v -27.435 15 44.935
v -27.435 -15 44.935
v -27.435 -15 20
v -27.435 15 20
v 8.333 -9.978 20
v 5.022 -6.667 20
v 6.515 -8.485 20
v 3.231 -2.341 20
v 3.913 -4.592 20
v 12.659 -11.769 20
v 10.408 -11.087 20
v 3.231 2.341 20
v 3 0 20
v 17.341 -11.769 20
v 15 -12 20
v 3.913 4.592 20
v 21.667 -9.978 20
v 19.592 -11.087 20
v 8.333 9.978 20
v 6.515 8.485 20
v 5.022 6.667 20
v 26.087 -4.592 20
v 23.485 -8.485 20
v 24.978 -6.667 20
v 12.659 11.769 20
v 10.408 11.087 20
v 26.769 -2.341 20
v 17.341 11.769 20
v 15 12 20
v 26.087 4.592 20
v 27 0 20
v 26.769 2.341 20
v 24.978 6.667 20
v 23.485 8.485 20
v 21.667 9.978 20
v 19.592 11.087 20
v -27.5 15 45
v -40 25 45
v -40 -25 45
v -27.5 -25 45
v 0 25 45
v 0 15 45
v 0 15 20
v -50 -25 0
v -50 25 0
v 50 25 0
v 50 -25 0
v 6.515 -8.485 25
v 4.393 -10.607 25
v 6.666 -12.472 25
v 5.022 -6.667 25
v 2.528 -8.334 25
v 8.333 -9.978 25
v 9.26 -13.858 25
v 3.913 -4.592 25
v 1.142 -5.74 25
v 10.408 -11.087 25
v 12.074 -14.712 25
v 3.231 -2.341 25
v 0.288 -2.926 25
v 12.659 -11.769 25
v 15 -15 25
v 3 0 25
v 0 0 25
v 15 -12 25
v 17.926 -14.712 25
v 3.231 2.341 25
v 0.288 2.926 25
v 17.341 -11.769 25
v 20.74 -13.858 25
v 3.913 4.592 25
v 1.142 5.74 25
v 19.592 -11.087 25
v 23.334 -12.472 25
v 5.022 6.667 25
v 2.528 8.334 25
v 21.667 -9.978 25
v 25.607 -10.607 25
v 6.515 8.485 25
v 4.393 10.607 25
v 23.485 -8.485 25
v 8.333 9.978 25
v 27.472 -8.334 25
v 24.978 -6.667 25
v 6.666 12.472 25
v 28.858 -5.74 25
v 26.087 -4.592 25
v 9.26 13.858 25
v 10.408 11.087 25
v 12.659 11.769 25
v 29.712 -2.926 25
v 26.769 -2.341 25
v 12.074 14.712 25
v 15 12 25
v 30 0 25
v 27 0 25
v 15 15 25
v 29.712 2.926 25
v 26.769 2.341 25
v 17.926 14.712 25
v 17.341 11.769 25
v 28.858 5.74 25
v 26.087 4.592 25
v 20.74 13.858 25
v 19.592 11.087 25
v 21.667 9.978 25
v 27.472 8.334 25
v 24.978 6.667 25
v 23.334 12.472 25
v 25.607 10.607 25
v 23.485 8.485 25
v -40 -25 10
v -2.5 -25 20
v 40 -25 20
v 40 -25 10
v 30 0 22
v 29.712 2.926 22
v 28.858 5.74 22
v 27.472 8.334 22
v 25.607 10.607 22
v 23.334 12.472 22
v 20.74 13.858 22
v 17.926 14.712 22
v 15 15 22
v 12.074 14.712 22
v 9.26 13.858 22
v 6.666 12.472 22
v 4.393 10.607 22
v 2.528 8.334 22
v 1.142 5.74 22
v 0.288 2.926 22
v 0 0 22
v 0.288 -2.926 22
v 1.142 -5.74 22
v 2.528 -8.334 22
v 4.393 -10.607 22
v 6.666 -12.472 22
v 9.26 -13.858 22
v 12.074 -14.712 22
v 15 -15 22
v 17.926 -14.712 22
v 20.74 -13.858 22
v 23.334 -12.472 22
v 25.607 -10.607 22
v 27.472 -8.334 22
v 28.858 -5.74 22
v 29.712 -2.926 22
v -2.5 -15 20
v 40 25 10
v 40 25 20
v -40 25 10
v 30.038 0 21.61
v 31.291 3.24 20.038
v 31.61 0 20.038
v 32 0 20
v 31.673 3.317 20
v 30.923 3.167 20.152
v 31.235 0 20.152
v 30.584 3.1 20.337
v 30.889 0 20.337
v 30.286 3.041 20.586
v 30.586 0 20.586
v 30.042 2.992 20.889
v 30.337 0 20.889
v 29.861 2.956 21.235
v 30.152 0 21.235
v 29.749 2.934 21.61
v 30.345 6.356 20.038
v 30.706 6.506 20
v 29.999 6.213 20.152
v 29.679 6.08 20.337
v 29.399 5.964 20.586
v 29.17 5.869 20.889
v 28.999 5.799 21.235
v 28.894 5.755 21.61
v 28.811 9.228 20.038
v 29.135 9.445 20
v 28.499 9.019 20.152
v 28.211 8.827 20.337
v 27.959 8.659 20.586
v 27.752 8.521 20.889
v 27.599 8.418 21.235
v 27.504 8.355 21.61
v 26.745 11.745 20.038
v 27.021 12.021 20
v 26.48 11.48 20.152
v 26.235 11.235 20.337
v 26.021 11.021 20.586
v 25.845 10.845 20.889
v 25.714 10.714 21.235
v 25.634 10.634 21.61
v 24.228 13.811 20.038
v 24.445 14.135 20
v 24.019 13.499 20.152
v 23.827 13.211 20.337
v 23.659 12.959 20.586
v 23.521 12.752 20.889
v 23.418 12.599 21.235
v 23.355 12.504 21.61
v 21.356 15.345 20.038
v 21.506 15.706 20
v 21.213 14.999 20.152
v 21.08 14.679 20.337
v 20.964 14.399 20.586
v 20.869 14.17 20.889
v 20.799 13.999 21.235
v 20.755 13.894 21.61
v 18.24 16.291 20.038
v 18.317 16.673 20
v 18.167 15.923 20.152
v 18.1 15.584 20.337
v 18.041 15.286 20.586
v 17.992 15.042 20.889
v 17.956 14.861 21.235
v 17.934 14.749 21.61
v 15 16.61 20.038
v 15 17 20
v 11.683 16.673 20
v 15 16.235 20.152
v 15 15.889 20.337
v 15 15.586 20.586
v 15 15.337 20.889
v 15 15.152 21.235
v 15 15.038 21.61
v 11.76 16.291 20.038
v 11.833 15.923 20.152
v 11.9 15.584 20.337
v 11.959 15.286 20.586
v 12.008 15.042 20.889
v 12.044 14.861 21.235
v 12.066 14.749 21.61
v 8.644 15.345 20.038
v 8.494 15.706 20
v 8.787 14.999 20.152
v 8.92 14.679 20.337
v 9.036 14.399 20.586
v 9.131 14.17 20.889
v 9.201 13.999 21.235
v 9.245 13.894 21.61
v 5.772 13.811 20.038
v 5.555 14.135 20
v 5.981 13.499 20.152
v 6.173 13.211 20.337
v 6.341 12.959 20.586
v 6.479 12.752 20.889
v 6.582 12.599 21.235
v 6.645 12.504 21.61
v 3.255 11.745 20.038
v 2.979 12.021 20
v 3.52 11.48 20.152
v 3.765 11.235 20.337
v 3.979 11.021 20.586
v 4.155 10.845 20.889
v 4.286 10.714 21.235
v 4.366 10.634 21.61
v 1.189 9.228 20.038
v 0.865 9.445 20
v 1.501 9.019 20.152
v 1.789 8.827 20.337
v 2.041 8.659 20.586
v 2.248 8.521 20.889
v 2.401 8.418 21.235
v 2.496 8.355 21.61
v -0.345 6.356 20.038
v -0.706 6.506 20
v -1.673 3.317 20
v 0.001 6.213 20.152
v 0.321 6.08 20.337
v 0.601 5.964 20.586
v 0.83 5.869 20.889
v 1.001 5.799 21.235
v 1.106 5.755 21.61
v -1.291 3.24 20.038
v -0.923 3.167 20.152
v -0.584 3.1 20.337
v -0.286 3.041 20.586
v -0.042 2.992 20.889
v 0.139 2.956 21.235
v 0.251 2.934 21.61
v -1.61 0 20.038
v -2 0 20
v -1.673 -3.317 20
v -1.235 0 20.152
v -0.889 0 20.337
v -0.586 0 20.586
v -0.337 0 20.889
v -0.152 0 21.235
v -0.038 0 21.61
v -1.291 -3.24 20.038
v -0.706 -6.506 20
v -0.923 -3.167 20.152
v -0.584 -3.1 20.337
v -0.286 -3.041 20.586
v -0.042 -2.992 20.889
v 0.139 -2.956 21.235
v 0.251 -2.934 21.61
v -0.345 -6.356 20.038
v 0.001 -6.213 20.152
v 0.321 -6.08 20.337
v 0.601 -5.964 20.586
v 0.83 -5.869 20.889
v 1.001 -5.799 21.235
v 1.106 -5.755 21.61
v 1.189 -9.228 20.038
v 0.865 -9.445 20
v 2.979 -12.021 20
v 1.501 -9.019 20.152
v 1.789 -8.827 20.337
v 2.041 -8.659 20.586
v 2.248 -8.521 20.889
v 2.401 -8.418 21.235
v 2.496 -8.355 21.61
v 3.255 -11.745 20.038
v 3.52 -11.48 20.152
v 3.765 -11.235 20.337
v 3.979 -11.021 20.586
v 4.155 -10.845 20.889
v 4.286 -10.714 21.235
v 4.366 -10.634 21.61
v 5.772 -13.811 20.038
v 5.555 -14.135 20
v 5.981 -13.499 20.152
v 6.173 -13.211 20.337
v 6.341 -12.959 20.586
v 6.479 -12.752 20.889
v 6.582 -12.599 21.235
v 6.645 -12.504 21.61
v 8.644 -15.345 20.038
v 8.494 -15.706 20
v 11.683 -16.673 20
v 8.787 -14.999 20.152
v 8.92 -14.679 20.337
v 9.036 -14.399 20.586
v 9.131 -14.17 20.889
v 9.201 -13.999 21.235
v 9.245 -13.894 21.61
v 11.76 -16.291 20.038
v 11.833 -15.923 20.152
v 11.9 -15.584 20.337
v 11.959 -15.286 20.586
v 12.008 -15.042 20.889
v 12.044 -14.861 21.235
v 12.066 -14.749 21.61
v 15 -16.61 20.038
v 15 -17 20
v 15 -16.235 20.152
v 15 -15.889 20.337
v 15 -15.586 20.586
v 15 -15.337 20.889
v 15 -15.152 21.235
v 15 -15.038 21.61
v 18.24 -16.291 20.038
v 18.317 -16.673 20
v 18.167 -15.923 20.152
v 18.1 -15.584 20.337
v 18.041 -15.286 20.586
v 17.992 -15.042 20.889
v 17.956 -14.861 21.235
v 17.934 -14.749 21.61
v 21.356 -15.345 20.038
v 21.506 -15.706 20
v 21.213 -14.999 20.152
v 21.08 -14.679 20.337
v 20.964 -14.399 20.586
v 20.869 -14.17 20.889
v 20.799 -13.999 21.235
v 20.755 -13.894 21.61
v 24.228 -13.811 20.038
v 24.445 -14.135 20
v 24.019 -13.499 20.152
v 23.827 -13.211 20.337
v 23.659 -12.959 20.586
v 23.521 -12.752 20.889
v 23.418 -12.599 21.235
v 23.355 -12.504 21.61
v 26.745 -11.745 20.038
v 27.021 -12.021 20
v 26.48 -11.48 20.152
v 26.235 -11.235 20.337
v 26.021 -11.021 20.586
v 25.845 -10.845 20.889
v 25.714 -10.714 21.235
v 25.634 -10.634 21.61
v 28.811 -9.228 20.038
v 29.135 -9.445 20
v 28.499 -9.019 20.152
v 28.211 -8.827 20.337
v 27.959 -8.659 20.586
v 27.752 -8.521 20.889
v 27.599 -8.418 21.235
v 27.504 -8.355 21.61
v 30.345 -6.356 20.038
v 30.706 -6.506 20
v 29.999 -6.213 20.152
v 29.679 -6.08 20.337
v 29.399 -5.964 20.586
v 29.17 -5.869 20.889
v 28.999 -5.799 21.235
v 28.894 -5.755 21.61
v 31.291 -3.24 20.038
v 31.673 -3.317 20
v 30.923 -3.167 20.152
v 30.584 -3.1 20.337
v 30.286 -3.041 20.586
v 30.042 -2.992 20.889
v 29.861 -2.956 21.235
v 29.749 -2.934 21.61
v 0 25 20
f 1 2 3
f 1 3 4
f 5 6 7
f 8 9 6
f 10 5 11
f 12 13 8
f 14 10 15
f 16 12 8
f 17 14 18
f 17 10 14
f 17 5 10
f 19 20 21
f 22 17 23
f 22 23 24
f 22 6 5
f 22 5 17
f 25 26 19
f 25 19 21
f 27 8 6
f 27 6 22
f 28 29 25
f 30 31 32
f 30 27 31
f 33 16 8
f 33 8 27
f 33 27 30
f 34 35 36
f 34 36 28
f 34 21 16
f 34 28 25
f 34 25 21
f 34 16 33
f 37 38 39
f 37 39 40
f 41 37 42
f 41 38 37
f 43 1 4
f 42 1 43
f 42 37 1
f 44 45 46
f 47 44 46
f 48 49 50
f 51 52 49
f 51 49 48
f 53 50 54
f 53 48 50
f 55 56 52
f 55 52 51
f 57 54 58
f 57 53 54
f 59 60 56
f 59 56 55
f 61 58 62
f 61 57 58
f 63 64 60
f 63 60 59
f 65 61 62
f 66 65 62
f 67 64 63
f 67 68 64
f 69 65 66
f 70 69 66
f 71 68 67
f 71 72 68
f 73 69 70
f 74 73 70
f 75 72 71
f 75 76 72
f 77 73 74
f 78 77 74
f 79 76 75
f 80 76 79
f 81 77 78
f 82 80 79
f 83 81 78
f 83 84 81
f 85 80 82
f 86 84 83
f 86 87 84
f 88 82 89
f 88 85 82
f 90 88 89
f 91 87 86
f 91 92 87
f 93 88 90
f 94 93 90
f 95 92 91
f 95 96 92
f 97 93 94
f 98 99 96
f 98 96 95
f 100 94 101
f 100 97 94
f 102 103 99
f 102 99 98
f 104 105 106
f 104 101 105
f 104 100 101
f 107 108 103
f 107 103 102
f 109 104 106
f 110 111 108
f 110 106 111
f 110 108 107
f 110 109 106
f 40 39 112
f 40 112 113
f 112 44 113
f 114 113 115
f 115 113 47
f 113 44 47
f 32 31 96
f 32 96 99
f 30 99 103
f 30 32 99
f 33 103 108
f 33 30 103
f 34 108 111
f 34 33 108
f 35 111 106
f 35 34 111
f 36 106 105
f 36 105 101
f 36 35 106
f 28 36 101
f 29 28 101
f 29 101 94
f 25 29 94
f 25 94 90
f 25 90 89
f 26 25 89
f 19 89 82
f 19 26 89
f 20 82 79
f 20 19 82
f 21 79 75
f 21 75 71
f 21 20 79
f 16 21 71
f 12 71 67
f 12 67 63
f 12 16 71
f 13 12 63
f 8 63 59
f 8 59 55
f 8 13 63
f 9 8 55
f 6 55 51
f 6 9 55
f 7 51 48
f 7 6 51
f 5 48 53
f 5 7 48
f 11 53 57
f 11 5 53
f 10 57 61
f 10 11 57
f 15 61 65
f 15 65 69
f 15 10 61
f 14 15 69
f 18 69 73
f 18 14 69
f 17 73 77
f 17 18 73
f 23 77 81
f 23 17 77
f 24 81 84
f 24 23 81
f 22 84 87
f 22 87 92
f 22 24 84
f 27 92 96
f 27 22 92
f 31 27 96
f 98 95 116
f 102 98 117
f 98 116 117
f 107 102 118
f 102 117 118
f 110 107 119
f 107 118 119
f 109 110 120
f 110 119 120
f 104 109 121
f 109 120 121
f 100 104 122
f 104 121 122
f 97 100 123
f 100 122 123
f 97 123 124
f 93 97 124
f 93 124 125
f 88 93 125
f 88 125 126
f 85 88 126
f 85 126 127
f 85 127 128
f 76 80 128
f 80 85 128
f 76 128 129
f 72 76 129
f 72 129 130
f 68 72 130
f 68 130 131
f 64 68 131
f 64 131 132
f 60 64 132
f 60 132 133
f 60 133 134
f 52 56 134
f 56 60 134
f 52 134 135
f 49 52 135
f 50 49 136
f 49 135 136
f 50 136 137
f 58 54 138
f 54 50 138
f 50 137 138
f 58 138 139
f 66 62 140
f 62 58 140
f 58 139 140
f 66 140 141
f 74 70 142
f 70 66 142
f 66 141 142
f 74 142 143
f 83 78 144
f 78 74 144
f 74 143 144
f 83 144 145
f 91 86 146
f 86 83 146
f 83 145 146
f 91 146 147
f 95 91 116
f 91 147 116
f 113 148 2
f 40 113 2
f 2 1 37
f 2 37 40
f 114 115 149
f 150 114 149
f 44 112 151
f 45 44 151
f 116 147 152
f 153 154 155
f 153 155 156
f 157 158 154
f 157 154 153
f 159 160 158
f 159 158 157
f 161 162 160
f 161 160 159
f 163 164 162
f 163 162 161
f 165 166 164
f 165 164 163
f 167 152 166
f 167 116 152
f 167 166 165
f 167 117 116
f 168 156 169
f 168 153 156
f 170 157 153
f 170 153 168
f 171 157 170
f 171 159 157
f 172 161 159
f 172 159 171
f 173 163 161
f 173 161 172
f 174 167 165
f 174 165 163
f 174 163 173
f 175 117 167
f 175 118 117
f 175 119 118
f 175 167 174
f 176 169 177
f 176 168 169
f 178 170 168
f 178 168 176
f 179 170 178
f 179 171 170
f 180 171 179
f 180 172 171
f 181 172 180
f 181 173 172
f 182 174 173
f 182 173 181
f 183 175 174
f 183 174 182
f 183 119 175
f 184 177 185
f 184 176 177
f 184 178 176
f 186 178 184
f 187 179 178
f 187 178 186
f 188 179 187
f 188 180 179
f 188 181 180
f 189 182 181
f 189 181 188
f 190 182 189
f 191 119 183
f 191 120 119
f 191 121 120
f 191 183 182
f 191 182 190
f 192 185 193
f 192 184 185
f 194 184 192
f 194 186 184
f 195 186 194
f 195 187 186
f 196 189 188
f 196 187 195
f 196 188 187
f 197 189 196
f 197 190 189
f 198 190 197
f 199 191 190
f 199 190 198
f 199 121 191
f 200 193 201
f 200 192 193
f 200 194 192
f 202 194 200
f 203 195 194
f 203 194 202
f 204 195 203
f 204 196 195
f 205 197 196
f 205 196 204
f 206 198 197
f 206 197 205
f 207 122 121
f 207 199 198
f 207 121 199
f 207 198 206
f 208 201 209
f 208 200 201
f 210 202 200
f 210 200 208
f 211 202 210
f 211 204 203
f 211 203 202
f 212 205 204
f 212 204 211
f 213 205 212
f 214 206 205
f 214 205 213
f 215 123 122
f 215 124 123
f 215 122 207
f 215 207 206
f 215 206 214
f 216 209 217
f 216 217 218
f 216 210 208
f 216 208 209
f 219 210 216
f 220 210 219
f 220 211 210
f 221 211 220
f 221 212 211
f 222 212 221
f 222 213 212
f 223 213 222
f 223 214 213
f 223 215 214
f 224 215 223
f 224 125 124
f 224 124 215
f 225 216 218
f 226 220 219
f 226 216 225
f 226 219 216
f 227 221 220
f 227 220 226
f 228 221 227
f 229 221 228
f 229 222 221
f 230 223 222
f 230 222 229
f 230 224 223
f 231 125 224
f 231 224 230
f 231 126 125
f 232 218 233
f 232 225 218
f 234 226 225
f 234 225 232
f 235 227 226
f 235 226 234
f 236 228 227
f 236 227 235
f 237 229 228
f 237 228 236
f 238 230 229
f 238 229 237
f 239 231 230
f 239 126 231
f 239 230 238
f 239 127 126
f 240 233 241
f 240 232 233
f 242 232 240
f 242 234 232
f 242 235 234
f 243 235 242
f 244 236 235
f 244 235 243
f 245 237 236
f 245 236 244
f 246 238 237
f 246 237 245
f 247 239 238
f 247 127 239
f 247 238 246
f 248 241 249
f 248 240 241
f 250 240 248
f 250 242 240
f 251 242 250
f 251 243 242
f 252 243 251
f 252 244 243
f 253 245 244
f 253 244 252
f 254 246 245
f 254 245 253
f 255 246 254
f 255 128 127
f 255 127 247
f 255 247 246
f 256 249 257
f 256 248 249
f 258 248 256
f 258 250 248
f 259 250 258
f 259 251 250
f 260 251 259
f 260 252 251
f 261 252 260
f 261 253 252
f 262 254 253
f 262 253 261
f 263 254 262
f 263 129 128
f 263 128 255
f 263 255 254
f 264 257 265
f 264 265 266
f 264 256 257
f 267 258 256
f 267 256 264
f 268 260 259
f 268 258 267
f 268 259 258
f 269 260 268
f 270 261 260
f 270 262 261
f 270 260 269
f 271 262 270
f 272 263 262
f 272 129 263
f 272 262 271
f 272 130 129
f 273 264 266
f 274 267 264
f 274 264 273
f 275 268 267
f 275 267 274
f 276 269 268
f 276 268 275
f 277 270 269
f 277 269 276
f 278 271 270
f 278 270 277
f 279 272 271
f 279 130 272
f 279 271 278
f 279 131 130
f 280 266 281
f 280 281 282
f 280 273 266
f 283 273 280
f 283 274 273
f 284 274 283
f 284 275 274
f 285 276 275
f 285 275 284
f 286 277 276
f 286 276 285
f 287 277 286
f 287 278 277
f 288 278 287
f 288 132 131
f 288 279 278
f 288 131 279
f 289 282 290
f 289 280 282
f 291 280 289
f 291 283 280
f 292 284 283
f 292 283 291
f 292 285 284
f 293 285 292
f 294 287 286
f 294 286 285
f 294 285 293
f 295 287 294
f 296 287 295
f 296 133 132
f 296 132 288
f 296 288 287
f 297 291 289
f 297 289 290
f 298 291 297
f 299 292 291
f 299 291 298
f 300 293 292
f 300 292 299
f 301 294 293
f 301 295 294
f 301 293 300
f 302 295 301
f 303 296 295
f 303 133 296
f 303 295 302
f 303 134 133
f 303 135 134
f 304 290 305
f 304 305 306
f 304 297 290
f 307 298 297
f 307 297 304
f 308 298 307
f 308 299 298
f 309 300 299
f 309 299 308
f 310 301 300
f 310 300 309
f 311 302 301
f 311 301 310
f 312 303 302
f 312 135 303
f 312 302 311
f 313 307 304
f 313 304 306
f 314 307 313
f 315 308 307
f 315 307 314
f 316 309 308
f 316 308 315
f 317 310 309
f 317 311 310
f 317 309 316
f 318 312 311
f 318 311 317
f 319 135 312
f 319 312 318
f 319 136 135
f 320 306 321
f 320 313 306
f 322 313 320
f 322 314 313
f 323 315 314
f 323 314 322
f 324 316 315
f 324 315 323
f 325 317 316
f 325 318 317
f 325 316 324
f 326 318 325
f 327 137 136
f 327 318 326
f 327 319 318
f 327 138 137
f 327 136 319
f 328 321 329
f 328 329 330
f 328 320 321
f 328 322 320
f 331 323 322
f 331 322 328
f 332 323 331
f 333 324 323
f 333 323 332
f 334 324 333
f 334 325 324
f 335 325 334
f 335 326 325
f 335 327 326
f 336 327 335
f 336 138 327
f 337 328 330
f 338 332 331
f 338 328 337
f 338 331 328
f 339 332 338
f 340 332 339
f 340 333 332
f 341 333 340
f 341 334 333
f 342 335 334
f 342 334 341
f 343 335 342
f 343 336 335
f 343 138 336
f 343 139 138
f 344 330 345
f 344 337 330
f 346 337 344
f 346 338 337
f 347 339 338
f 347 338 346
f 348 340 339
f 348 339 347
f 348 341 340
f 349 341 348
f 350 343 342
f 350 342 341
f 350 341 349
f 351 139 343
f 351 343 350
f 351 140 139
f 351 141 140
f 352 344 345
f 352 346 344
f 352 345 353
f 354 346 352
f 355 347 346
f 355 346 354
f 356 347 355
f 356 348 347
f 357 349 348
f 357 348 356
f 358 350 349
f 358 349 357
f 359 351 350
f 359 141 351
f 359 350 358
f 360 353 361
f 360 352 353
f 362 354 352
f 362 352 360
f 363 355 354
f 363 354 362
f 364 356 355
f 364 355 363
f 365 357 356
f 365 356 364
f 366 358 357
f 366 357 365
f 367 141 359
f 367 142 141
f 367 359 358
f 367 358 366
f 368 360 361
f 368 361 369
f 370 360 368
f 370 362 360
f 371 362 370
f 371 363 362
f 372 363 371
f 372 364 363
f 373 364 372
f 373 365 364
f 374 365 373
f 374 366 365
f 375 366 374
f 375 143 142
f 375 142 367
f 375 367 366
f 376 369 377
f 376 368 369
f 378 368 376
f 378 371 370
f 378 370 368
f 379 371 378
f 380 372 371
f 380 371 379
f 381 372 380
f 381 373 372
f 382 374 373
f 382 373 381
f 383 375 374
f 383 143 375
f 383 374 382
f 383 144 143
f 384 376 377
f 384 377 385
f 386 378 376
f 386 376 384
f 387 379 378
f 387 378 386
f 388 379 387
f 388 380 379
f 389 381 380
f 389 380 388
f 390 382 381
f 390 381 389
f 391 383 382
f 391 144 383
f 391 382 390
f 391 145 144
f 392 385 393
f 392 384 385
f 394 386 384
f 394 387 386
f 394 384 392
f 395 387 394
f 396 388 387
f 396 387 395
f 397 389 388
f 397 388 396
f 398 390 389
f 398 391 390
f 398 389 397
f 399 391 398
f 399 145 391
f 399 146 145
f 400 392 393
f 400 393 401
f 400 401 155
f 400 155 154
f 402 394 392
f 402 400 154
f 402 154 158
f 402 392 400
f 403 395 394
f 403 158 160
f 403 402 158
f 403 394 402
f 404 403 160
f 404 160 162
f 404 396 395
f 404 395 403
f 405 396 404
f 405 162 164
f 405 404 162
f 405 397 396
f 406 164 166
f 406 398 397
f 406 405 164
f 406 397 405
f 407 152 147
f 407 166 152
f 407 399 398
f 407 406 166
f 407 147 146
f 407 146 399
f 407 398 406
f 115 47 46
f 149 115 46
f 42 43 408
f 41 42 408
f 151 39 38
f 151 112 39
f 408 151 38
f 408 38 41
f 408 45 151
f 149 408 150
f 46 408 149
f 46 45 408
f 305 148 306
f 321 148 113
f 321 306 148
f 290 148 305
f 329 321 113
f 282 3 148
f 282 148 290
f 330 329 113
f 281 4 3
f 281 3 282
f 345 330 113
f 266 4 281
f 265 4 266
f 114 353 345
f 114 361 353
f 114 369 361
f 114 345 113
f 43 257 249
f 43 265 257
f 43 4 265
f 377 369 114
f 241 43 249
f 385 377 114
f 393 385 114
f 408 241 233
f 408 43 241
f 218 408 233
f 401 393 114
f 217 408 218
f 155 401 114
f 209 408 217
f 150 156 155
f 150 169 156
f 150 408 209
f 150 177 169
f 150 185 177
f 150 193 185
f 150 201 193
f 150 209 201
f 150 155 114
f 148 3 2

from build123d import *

# Parameters (mm, degrees)
SKETCH1_W           = 100
SKETCH1_H           = 50
BOSS_EXTRUDE2_DEPTH = 10
SKETCH3_W           = 80
SKETCH3_H           = 50
BOSS_EXTRUDE3_DEPTH = 10
SKETCH4_W           = 40
SKETCH4_H           = 50
BOSS_EXTRUDE4_DEPTH = 25
SKETCH5_W           = 60
SKETCH5_H           = 30
CUT_EXTRUDE1_DEPTH  = 25
SKETCH6_R           = 15
SKETCH6_R_2         = 12
BOSS_EXTRUDE5_DEPTH = 5
CHAMFER2_SIZE       = 10
CHAMFER3_SIZE       = 10
FILLET3_R           = 2
CHAMFER6_SIZE       = 27.5


# Some blends are built 0.0001 mm under size
with BuildPart() as part:
    # Sketch1 → Boss-Extrude2 (new body)
    with BuildSketch(Plane.XY):
        Rectangle(SKETCH1_W, SKETCH1_H)
    extrude(amount=BOSS_EXTRUDE2_DEPTH)

    # Sketch3 → Boss-Extrude3 (add)
    with BuildSketch(Plane.XY.offset(10)):
        Rectangle(SKETCH3_W, SKETCH3_H)
    extrude(amount=BOSS_EXTRUDE3_DEPTH)

    # Sketch4 → Boss-Extrude4 (add)
    with BuildSketch(Plane.XY.offset(20)):
        with Locations((-20, 0)):
            Rectangle(SKETCH4_W, SKETCH4_H)
    extrude(amount=BOSS_EXTRUDE4_DEPTH)

    # Sketch5 → Cut-Extrude1 (cut)
    with BuildSketch(Plane.XY.offset(45)):
        with Locations((2.565042783, 0)):
            Rectangle(SKETCH5_W, SKETCH5_H)
    extrude(amount=-CUT_EXTRUDE1_DEPTH, mode=Mode.SUBTRACT)

    # Sketch6 → Boss-Extrude5 (add)
    with BuildSketch(Plane.XY.offset(20)):
        with Locations((15, 0)):
            Circle(SKETCH6_R)
        with Locations((15, 0)):
            Circle(SKETCH6_R_2, mode=Mode.SUBTRACT)
    extrude(amount=BOSS_EXTRUDE5_DEPTH)

    # Chamfer2
    chamfer2_edges = [part.edges().sort_by_distance(p)[0] for p in [
        (50, 0, 10),
    ]]
    chamfer(chamfer2_edges, length=CHAMFER2_SIZE - 0.0001)  # a hair under: the kernel refuses the full size

    # Chamfer3
    chamfer3_edges = [part.edges().sort_by_distance(p)[0] for p in [
        (-50, 0, 10),
    ]]
    chamfer(chamfer3_edges, length=CHAMFER3_SIZE - 0.0001)  # a hair under: the kernel refuses the full size

    # Fillet3
    fillet3_edges = [part.edges().sort_by_distance(p)[0] for p in [
        (0, 0, 20),
    ]]
    fillet(fillet3_edges, radius=FILLET3_R)

    # Chamfer6
    # the kernel refuses this chamfer: 27.5 mm, written as the material it takes off along each edge
    with BuildSketch(Plane(origin=(0, -15, 45), x_dir=(0.027495876610586376, 0, -0.9996219169112968), z_dir=(0, -1, 0))) as chamfer6_piece_1_section:
        Polygon((CHAMFER6_SIZE * 0.999621916911, -CHAMFER6_SIZE * 0.0274958766106), (-CHAMFER6_SIZE * 0.0274958766106, -CHAMFER6_SIZE * 0.999621916911), (0, 0), align=None)
    chamfer6_piece_1 = extrude(amount=80.721282169, mode=Mode.PRIVATE)
    chamfer6_piece_1 = split(chamfer6_piece_1, bisect_by=Plane(origin=(-2.708333333, -20, 20), z_dir=(0, 0, 1)), keep=Keep.TOP, mode=Mode.PRIVATE)
    add(chamfer6_piece_1, mode=Mode.SUBTRACT)
    with BuildSketch(Plane(origin=(0, 55.721282169, 45), x_dir=(0.027495876610586376, 0, -0.9996219169112968), z_dir=(0, -1, 0))) as chamfer6_piece_2_section:
        Polygon((CHAMFER6_SIZE * 0.999621916911, -CHAMFER6_SIZE * 0.0274958766106), (-CHAMFER6_SIZE * 0.0274958766106, -CHAMFER6_SIZE * 0.999621916911), (0, 0), align=None)
    chamfer6_piece_2 = extrude(amount=151.442564338, mode=Mode.PRIVATE)
    chamfer6_piece_2 = split(chamfer6_piece_2, bisect_by=Plane(origin=(-27.456638145, 15, 44.978319072), z_dir=(0, -1, 0)), keep=Keep.TOP, mode=Mode.PRIVATE)
    chamfer6_piece_2 = split(chamfer6_piece_2, bisect_by=Plane(origin=(-27.456638145, 0, 25), z_dir=(0, 0, 1)), keep=Keep.TOP, mode=Mode.PRIVATE)
    add(chamfer6_piece_2, mode=Mode.SUBTRACT)


solid = part.part
